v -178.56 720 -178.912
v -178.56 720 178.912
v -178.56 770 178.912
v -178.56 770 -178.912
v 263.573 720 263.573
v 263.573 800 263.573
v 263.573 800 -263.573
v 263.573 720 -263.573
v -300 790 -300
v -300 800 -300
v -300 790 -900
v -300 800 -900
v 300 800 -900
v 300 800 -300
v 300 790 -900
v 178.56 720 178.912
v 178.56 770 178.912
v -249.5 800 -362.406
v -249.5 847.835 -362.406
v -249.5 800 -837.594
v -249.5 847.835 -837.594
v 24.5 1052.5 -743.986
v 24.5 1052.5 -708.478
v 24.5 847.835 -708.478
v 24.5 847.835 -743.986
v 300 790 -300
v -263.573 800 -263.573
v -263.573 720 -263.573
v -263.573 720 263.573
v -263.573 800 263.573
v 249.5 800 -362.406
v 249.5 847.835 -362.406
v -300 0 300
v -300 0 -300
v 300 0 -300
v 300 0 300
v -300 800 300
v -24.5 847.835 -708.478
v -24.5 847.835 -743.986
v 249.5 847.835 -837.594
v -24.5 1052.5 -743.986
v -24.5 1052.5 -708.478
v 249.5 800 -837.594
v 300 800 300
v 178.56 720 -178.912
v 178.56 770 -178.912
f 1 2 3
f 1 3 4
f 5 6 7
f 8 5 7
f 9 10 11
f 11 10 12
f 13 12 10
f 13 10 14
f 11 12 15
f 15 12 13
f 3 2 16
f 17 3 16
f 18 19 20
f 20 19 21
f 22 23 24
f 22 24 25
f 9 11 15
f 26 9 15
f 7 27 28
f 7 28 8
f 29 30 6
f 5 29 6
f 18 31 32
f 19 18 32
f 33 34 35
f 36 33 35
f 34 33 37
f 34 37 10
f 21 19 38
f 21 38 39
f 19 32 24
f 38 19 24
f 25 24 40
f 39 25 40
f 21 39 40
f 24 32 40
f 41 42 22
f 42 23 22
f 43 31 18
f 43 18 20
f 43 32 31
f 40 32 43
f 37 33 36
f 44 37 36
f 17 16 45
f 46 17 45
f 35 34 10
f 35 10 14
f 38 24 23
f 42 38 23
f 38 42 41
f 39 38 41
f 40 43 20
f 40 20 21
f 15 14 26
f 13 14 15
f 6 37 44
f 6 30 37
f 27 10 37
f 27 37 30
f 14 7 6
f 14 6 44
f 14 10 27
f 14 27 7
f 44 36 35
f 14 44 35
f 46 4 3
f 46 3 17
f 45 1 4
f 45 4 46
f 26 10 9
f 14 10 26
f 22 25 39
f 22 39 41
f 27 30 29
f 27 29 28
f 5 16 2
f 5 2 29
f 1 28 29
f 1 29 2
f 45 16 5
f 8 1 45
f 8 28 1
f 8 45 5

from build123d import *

# Parameters (mm, degrees)
SKETCH1_W           = 600
SKETCH1_H           = 600
BOSS_EXTRUDE1_DEPTH = 800
SKETCH2_W           = 527.145840922
SKETCH2_H           = 527.145840922
CUT_EXTRUDE2_DEPTH  = 80
SKETCH3_W           = 357.119076562
SKETCH3_H           = 357.823453438
BOSS_EXTRUDE2_DEPTH = 50
SKETCH4_W           = 600
SKETCH4_H           = 600
BOSS_EXTRUDE3_DEPTH = 10
SKETCH7_W           = 475.188659882
SKETCH7_H           = 47.834663464
BOSS_EXTRUDE8_DEPTH = 249.5
SKETCH15_W          = 35.508173295
SKETCH15_H          = 204.665336536
BOSS_EXTRUDE9_DEPTH = 24.5


with BuildPart() as part:
    # Sketch1 → Boss-Extrude1 (new body)
    with BuildSketch(Plane(origin=(0, 0, 0), x_dir=(1, 0, 0), z_dir=(0, 1, 0))):
        Rectangle(SKETCH1_W, SKETCH1_H)
    extrude(amount=BOSS_EXTRUDE1_DEPTH)

    # Sketch2 → Cut-Extrude2 (cut)
    with BuildSketch(Plane(origin=(0, 800, 0), x_dir=(1, 0, 0), z_dir=(0, 1, 0))):
        Rectangle(SKETCH2_W, SKETCH2_H)
    extrude(amount=-CUT_EXTRUDE2_DEPTH, mode=Mode.SUBTRACT)

    # Sketch3 → Boss-Extrude2 (add)
    with BuildSketch(Plane(origin=(0, 720, 0), x_dir=(1, 0, 0), z_dir=(0, 1, 0))):
        Rectangle(SKETCH3_W, SKETCH3_H)
    extrude(amount=BOSS_EXTRUDE2_DEPTH)


with BuildPart() as body_2:
    # Sketch4 → Boss-Extrude3 (new body)
    with BuildSketch(Plane(origin=(0, 800, 0), x_dir=(1, 0, 0), z_dir=(0, 1, 0))):
        with Locations((0, 600)):
            Rectangle(SKETCH4_W, SKETCH4_H)
    extrude(amount=-BOSS_EXTRUDE3_DEPTH)


with BuildPart() as body_3:
    # Sketch7 → Boss-Extrude8 (new body, symmetric)
    with BuildSketch(Plane(origin=(0, 0, 0), x_dir=(0, 0, -1), z_dir=(1, 0, 0))):
        with Locations((600, 823.917331732)):
            Rectangle(SKETCH7_W, SKETCH7_H)
    extrude(amount=BOSS_EXTRUDE8_DEPTH, both=True)

    # Sketch15 → Boss-Extrude9 (add, symmetric)
    with BuildSketch(Plane(origin=(0, 0, 0), x_dir=(0, 0, -1), z_dir=(1, 0, 0))):
        with Locations((726.23170897, 950.167331732)):
            Rectangle(SKETCH15_W, SKETCH15_H)
    extrude(amount=BOSS_EXTRUDE9_DEPTH, both=True)


solid = Compound([part.part, body_2.part, body_3.part])
